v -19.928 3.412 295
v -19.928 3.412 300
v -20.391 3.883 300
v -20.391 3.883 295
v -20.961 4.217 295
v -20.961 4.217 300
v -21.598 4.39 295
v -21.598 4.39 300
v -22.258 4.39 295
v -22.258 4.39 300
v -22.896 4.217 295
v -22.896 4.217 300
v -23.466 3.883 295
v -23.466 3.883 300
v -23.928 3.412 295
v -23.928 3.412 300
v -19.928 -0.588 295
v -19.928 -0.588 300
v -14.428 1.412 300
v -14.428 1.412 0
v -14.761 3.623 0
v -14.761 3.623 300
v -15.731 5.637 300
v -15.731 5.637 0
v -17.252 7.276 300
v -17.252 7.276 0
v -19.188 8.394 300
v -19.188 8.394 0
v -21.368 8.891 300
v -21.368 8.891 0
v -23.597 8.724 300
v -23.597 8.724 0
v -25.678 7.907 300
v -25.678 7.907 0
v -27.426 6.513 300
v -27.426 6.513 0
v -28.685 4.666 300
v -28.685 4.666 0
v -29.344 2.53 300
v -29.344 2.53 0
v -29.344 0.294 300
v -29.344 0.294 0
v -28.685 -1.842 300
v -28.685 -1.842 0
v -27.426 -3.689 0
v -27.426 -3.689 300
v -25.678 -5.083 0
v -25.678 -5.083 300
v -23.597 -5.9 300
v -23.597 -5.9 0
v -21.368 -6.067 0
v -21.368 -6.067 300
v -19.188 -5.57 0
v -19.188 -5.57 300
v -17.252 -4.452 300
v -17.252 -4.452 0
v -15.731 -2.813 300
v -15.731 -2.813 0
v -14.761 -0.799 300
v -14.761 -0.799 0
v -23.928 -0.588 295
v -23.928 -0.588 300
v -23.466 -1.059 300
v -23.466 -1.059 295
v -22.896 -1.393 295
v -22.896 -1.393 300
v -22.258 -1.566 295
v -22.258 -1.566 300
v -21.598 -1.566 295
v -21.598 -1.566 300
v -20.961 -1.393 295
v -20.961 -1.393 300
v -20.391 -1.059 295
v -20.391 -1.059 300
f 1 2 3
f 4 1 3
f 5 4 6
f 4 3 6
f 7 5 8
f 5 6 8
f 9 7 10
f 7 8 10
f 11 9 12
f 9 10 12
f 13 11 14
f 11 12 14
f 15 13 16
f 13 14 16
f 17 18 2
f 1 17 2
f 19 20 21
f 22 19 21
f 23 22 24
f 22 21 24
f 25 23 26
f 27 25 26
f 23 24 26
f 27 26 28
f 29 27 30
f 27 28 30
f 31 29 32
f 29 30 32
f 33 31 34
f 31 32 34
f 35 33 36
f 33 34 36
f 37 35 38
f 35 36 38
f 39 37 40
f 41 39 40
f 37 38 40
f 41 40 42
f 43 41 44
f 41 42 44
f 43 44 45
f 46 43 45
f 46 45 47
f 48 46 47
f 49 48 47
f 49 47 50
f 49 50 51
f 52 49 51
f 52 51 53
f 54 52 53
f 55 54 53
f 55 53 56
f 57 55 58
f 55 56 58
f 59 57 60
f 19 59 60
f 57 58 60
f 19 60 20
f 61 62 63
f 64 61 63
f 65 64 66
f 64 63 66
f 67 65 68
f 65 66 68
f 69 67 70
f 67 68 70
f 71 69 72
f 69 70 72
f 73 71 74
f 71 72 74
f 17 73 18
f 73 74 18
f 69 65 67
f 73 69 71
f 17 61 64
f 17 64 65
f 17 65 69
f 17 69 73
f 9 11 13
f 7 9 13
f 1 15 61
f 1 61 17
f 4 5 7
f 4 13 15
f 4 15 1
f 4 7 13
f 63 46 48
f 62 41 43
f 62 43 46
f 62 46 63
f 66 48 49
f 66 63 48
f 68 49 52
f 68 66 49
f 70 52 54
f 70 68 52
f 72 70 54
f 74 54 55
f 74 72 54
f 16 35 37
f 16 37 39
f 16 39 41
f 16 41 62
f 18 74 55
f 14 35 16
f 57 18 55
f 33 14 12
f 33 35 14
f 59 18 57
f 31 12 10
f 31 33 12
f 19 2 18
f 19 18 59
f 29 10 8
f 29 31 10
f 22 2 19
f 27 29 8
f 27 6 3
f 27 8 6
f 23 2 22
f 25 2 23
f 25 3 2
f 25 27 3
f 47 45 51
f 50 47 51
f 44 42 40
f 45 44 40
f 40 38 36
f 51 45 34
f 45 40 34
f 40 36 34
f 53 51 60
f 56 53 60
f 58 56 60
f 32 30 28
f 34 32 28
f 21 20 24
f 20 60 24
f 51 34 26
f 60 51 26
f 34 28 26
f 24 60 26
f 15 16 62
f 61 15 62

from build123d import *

# Parameters (mm, degrees)
SKETCH1_R           = 7.5
BOSS_EXTRUDE1_DEPTH = 300
CUT_EXTRUDE1_DEPTH  = 5


with BuildPart() as part:
    # Sketch1 → Boss-Extrude1 (new body)
    with BuildSketch(Plane.XY):
        with Locations((-21.928145629, 1.412024527)):
            Circle(SKETCH1_R)
    extrude(amount=BOSS_EXTRUDE1_DEPTH)

    # Sketch2 → Cut-Extrude1 (cut)
    with BuildSketch(Plane.XY.offset(300)):
        with BuildLine():
            Line((-23.928145629, 3.412024527), (-23.928145629, -0.587975473))
            ThreePointArc((-23.928145629, -0.587975473), (-21.928145629, -1.587975473), (-19.928145629, -0.587975473))
            Line((-19.928145629, -0.587975473), (-19.928145629, 3.412024527))
            ThreePointArc((-19.928145629, 3.412024527), (-21.928145629, 4.412024527), (-23.928145629, 3.412024527))
        make_face()
    extrude(amount=-CUT_EXTRUDE1_DEPTH, mode=Mode.SUBTRACT)


solid = part.part
